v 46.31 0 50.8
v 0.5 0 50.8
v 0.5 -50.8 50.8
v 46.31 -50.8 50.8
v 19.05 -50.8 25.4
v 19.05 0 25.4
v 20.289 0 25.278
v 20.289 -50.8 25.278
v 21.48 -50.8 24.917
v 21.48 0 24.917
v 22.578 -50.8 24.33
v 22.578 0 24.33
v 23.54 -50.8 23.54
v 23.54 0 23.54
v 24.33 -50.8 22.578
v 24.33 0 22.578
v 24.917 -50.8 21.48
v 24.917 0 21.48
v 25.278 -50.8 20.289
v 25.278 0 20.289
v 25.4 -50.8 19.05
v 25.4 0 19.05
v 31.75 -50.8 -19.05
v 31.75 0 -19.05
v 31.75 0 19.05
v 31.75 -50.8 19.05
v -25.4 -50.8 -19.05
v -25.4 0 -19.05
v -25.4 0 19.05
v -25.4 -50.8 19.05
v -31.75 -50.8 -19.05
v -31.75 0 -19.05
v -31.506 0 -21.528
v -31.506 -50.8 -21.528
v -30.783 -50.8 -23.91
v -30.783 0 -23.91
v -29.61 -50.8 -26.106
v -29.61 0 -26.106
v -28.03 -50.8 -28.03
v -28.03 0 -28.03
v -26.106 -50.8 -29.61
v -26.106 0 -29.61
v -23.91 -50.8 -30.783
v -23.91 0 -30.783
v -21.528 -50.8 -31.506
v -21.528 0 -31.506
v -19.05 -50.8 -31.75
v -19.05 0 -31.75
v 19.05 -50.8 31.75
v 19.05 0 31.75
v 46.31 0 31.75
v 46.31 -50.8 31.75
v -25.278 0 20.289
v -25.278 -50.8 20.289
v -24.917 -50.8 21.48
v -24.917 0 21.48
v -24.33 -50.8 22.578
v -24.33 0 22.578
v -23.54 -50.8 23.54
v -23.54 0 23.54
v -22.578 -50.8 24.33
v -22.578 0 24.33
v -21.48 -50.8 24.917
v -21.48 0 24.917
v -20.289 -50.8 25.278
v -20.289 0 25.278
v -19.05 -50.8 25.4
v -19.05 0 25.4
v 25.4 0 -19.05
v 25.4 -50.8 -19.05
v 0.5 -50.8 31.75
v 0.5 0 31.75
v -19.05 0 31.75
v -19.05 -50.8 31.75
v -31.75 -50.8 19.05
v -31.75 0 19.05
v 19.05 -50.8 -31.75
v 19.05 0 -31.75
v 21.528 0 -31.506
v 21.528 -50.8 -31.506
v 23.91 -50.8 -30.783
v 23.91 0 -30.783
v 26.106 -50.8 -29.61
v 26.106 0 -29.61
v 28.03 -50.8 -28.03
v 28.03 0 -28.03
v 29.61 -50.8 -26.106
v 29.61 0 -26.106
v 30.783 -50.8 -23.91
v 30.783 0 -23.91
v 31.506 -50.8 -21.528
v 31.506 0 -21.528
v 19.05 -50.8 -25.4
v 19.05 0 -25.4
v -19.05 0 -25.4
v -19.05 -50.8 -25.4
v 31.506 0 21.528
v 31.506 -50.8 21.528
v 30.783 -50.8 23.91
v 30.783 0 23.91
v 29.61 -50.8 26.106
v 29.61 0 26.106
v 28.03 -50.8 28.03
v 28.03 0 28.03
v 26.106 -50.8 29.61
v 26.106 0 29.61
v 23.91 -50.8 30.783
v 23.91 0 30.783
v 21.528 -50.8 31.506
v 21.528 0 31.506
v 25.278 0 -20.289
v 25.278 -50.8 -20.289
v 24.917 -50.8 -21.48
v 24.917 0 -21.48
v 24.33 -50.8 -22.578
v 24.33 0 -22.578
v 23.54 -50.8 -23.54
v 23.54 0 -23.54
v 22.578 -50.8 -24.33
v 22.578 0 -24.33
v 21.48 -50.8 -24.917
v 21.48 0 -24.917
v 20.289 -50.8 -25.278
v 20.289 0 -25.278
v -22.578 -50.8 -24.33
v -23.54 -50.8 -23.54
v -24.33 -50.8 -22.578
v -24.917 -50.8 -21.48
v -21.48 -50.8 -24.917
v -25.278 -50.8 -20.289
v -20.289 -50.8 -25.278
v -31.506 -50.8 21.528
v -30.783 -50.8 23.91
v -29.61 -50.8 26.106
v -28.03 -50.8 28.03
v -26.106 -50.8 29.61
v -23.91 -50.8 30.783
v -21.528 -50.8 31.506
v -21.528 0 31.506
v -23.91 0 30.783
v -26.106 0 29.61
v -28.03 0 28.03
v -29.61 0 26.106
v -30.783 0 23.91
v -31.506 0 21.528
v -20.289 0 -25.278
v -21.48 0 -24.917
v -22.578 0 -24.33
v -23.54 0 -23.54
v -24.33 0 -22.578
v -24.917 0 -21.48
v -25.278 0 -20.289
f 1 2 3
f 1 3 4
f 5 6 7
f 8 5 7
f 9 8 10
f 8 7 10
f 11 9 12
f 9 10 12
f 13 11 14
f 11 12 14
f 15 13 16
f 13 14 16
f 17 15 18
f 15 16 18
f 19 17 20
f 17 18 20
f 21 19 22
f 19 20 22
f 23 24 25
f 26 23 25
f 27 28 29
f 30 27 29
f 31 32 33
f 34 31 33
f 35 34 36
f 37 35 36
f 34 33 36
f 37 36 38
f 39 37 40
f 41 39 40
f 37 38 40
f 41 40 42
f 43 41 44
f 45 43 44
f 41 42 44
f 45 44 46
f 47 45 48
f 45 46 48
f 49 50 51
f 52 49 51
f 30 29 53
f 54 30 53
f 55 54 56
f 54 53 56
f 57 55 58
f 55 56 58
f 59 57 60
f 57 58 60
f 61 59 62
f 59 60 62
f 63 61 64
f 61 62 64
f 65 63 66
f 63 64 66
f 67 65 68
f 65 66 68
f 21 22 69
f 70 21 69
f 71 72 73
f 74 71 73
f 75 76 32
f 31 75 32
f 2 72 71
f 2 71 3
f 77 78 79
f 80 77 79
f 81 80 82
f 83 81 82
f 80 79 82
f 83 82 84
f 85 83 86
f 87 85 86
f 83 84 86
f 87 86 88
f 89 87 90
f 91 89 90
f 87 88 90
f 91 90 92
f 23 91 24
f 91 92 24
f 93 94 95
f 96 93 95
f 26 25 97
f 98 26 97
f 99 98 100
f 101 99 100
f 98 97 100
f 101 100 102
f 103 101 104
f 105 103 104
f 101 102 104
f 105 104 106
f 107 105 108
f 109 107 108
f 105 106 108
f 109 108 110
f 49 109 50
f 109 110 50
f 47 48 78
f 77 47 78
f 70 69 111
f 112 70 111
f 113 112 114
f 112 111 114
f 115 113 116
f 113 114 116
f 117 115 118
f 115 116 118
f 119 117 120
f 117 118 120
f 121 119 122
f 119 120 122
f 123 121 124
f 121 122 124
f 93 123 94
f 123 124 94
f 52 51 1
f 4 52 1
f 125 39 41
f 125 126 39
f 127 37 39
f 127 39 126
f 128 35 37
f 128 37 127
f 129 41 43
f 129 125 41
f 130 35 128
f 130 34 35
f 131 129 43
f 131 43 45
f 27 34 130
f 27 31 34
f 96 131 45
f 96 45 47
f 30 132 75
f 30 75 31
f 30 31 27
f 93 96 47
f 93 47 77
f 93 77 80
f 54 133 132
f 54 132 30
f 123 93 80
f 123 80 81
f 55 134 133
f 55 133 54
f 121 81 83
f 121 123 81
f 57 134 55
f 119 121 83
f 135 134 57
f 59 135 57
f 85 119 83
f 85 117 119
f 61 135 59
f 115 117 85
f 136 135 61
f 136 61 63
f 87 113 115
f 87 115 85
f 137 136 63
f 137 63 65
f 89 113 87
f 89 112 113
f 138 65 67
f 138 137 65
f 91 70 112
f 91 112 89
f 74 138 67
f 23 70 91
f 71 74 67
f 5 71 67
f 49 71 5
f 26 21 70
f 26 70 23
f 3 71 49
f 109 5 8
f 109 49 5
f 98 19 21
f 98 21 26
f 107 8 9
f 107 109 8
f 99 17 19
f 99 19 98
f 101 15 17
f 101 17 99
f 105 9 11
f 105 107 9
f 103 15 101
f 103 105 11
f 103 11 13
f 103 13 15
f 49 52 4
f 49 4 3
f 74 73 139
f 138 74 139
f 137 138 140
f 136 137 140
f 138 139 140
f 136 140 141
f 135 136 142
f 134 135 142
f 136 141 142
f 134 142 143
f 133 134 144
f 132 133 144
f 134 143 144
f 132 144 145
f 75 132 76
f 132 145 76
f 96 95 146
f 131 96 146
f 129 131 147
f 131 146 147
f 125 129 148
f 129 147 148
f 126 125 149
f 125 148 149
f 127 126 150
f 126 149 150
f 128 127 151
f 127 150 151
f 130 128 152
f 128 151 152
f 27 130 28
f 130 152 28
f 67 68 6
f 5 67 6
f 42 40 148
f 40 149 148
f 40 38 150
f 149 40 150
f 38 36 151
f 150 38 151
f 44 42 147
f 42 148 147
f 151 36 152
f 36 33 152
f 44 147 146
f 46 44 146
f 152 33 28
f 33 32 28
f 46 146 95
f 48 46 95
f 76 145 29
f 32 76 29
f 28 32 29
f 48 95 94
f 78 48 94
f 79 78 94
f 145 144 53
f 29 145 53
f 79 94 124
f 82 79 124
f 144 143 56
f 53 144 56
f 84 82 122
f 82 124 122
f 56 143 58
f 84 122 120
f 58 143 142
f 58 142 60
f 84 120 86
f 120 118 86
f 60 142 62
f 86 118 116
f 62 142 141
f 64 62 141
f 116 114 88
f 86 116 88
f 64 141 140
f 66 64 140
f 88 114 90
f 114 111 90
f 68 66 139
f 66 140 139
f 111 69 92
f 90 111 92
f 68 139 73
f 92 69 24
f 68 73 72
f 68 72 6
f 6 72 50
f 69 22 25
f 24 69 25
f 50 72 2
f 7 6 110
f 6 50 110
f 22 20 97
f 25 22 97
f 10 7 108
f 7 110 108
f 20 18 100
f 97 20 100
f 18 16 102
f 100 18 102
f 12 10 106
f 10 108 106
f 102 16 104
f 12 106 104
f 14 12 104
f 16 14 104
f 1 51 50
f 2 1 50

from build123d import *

# Parameters (mm, degrees)
F2_DEPTH = 50.8
F3_W     = 45.810133
F3_H     = 19.05
F4_DEPTH = 50.8


with BuildPart() as f2:
    # F0 (on Front) → F2 (new body)
    with BuildSketch(Plane.XZ):
        with BuildLine():
            ThreePointArc((31.75, 19.05), (28.030256, 28.030256), (19.05, 31.75))
            Line((19.05, 31.75), (-19.05, 31.75))
            ThreePointArc((-19.05, 31.75), (-28.030256, 28.030256), (-31.75, 19.05))
            Line((-31.75, 19.05), (-31.75, -19.05))
            ThreePointArc((-31.75, -19.05), (-28.030256, -28.030256), (-19.05, -31.75))
            Line((-19.05, -31.75), (19.05, -31.75))
            ThreePointArc((19.05, -31.75), (28.030256, -28.030256), (31.75, -19.05))
            Line((31.75, -19.05), (31.75, 19.05))
        make_face()
        with BuildLine():
            ThreePointArc((19.05, 25.4), (23.540128, 23.540128), (25.4, 19.05))
            Line((25.4, 19.05), (25.4, -19.05))
            ThreePointArc((25.4, -19.05), (23.540128, -23.540128), (19.05, -25.4))
            Line((19.05, -25.4), (-19.05, -25.4))
            ThreePointArc((-19.05, -25.4), (-23.540128, -23.540128), (-25.4, -19.05))
            Line((-25.4, -19.05), (-25.4, 19.05))
            ThreePointArc((-25.4, 19.05), (-23.540128, 23.540128), (-19.05, 25.4))
            Line((-19.05, 25.4), (19.05, 25.4))
        make_face(mode=Mode.SUBTRACT)
    extrude(amount=F2_DEPTH)

    # F3 (on Front) → F4 (join)
    with BuildSketch(Plane.XZ):
        with Locations((23.405067, 41.275)):
            Rectangle(F3_W, F3_H)
    extrude(amount=F4_DEPTH)


solid = f2.part
